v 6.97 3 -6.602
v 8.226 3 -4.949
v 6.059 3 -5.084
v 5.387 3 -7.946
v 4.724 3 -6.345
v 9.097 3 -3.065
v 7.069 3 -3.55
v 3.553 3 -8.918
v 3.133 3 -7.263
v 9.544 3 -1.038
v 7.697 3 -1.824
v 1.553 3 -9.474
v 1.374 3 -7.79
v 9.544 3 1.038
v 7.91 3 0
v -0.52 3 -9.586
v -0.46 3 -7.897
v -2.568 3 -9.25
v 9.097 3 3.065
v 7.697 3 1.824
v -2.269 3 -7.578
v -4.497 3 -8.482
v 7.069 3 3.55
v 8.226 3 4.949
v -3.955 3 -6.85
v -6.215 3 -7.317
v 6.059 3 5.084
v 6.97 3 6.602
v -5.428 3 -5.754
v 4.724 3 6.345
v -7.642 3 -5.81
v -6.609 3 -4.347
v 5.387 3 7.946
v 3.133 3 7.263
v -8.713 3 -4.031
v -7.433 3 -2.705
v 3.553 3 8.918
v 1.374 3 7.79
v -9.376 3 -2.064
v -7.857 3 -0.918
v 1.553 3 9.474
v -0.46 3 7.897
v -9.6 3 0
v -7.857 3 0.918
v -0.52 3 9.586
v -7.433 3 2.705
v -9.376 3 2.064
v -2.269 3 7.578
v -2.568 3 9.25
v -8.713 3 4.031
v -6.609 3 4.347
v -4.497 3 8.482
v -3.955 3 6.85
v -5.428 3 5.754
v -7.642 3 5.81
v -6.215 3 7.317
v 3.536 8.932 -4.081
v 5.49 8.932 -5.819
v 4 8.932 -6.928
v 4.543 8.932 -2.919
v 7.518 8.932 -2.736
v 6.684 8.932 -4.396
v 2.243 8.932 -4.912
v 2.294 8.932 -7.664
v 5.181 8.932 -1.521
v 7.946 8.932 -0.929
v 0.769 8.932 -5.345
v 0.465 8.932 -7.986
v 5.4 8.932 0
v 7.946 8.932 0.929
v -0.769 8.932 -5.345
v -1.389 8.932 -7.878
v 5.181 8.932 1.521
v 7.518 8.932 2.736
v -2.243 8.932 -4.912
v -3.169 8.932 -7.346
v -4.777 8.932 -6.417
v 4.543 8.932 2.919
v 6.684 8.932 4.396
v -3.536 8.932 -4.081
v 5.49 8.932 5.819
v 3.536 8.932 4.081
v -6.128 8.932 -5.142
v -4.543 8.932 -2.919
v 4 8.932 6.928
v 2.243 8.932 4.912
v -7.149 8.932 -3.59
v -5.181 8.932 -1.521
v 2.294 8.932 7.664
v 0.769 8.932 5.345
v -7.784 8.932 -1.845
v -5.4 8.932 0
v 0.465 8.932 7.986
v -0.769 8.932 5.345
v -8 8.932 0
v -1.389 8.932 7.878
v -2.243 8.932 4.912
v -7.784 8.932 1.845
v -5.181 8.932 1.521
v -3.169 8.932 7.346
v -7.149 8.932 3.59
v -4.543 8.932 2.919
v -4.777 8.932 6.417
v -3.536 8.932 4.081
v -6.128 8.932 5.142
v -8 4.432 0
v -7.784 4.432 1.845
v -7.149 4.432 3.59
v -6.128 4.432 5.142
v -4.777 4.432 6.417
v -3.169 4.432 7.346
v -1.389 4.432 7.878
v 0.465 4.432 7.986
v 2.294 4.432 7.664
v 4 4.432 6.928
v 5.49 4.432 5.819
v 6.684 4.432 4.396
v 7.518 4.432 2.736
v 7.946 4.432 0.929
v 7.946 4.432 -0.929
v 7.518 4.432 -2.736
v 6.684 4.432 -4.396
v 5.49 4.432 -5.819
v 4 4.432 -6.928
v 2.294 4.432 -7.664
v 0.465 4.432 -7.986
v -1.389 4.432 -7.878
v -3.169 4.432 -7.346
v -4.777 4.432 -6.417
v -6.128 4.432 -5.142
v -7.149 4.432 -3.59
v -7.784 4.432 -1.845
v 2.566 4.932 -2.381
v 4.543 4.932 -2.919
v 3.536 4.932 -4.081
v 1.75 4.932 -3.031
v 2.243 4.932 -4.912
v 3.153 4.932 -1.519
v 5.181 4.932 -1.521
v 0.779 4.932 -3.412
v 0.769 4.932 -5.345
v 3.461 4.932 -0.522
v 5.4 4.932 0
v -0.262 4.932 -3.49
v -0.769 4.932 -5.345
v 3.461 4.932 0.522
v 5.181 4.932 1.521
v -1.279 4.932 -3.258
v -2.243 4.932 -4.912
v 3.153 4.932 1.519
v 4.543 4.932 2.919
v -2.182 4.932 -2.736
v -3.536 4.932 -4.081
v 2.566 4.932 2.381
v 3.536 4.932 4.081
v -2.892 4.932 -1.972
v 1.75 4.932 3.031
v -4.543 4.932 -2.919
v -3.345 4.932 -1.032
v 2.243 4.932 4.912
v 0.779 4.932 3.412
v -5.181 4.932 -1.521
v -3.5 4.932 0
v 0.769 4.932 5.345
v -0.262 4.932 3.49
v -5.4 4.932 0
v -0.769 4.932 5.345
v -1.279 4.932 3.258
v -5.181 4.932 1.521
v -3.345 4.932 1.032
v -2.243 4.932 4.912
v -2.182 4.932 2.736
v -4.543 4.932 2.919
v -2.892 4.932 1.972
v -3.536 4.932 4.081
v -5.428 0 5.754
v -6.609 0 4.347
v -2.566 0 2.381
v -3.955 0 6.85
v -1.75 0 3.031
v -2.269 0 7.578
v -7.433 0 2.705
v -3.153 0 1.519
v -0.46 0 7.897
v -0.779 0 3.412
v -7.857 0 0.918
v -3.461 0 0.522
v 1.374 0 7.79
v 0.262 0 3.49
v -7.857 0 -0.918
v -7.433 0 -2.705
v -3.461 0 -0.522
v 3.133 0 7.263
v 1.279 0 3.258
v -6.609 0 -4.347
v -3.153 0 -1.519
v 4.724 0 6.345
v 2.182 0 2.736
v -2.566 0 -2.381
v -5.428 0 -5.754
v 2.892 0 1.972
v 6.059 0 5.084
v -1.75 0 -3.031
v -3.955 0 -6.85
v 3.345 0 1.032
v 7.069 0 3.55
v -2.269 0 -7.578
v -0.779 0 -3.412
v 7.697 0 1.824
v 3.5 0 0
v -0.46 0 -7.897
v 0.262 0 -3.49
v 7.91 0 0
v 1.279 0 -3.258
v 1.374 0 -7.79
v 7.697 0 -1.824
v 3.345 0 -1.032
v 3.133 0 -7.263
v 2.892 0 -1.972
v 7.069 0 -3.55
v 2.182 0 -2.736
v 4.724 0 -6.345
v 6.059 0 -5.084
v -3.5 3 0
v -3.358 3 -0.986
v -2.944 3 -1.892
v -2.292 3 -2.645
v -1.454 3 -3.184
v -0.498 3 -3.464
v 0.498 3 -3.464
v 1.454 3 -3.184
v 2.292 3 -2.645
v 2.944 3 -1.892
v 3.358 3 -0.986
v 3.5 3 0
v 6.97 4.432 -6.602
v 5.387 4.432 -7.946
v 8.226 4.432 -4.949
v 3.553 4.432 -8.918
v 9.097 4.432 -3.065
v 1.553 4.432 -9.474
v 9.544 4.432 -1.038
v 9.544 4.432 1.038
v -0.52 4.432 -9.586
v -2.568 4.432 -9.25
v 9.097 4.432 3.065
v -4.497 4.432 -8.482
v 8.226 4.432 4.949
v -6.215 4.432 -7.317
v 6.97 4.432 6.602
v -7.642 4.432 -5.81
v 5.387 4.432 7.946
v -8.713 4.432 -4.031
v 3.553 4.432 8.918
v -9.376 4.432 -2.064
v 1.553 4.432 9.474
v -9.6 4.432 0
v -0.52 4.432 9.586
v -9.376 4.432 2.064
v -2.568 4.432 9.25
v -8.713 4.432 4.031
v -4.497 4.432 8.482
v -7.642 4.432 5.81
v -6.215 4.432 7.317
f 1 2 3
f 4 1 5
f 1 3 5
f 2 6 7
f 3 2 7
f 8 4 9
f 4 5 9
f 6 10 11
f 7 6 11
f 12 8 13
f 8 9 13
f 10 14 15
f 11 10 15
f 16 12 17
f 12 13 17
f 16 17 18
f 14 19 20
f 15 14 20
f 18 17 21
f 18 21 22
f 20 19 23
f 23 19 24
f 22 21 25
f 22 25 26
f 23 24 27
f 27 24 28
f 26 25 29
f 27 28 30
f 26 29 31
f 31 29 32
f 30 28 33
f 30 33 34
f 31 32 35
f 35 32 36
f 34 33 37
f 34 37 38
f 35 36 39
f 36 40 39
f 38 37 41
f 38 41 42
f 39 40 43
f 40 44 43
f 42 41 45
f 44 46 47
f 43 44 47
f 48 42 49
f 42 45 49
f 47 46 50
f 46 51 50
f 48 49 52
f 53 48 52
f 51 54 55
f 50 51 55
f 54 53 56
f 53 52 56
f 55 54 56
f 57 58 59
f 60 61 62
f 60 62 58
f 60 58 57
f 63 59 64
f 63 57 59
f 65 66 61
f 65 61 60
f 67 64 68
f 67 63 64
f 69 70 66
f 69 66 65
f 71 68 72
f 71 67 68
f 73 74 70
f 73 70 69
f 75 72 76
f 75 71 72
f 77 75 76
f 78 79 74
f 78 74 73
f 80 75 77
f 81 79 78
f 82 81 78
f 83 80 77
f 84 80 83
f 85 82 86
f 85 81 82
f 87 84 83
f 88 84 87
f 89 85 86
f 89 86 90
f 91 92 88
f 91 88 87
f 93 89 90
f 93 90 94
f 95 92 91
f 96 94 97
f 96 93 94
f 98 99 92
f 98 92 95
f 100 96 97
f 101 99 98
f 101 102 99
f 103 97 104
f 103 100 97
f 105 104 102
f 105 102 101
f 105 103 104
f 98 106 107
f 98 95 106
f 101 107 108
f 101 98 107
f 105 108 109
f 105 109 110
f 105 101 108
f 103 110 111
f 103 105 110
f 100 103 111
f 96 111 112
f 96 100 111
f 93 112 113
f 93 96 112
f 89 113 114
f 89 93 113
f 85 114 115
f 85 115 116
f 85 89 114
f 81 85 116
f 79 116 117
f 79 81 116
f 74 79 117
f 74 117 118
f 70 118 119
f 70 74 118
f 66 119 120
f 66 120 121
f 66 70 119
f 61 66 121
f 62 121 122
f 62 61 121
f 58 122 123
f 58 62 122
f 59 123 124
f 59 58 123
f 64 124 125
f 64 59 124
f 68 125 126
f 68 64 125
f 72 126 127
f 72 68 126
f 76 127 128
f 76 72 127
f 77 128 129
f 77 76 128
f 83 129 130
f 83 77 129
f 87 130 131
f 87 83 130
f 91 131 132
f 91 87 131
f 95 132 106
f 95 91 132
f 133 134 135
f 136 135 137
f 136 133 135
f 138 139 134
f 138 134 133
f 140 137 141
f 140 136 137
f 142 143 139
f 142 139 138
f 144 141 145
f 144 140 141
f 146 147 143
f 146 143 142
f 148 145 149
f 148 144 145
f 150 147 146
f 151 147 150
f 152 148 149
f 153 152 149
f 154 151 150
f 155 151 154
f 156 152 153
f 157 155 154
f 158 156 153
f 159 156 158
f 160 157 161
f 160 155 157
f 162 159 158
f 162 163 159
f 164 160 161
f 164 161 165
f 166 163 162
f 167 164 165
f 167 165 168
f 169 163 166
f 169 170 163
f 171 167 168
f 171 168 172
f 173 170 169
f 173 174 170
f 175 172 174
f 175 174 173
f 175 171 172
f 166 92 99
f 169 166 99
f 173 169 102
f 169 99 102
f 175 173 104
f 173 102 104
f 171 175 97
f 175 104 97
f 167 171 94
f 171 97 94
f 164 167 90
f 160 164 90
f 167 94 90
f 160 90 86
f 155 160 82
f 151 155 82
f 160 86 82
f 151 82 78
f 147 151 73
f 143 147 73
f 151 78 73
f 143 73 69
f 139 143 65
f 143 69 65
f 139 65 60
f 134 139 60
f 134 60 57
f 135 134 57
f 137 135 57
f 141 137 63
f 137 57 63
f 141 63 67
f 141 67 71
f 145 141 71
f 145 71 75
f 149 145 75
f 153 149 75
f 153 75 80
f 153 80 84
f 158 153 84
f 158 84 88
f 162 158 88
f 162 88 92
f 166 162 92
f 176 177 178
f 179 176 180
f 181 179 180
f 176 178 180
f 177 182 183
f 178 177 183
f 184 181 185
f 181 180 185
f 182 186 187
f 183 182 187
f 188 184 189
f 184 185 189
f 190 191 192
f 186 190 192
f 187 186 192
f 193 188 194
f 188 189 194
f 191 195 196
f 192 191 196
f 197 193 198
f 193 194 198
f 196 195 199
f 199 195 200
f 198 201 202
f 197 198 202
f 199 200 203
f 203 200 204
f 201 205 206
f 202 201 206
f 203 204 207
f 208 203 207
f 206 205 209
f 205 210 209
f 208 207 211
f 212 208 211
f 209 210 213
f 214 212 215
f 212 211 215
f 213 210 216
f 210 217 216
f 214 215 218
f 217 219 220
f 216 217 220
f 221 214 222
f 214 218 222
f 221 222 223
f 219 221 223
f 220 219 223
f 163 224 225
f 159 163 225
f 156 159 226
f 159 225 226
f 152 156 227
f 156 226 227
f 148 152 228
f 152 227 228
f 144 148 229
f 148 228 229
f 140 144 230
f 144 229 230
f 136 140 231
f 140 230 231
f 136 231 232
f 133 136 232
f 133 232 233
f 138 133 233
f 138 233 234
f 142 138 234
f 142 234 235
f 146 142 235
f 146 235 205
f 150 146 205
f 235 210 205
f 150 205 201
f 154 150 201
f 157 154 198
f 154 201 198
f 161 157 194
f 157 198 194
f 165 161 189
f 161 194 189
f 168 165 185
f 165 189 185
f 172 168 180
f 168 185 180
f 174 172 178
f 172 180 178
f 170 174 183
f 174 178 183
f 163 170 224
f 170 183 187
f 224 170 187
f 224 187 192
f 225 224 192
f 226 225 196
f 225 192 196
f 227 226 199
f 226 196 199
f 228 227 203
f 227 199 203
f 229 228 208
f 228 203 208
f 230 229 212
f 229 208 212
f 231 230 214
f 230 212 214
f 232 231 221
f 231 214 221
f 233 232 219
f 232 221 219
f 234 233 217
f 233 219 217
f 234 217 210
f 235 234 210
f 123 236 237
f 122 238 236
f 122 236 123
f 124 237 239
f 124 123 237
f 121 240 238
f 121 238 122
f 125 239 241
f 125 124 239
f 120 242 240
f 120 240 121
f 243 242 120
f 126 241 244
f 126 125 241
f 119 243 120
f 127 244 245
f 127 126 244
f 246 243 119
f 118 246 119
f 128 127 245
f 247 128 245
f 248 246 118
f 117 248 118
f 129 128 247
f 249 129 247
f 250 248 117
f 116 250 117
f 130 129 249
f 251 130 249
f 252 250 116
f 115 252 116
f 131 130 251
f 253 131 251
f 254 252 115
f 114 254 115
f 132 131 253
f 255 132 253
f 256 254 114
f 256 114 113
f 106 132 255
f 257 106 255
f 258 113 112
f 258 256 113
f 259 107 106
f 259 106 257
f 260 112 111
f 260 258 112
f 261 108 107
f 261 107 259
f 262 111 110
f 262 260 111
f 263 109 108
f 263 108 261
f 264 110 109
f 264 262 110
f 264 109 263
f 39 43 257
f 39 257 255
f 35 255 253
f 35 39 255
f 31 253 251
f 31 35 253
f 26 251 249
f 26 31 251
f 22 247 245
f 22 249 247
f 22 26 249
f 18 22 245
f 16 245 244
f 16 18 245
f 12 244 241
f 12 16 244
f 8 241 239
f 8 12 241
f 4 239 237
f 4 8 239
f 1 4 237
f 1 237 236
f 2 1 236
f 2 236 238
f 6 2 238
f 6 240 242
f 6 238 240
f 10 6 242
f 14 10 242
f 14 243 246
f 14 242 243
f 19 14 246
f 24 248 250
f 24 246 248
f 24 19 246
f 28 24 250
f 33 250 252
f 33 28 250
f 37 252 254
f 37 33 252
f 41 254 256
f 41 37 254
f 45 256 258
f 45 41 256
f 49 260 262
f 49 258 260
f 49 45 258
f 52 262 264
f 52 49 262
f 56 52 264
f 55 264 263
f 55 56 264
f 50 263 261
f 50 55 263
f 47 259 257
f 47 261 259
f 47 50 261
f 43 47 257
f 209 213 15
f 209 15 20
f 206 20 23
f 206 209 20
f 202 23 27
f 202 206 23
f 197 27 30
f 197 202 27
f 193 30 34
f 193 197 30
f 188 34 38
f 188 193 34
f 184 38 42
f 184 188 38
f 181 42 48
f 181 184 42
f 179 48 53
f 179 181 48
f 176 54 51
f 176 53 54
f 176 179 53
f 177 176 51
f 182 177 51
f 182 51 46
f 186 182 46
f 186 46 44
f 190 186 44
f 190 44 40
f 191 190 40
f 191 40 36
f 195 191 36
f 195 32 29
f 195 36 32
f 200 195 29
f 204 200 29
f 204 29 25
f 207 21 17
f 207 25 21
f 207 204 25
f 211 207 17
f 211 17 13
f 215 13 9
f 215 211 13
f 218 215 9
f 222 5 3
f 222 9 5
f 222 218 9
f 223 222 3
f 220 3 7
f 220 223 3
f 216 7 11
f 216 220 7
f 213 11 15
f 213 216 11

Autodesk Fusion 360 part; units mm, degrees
sketch "Sketch1" plane through (0, 0, 0) normal (0, 1, 0) x (1, 0, 0)
  circle A0 centre (0, 0) radius 7.91
  circle A1 centre (0, 0) radius 3.5
  dimension "d1" = 15.82
  dimension "d2" = 7
extrude "Extrude1" add sketch "Sketch1" along normal blind 3
sketch "Sketch2" plane through (0, 3, 0) normal (0, 1, 0) x (-1, 0, 0)
  circle A0 centre (0, 0) radius 3.5
  circle A1 centre (0, 0) radius 7.91
  circle A2 centre (0, 0) radius 9.6
  dimension "d5" = 19.2
extrude "Extrude2" add sketch "Sketch2" along normal blind 6.932 contours A1 | A2
sketch "Sketch3" plane through (0, 9.932, 0) normal (0, 1, 0) x (-1, 0, 0)
  circle A0 centre (0, 0) radius 3.5
  circle A1 centre (0, 0) radius 9.6
  circle A2 centre (0, 0) radius 5.4
  dimension "d8" = 10.8
extrude "Extrude3" cut sketch "Sketch3" against normal blind 3 contours A2
sketch "Sketch4" plane through (0, 9.932, 0) normal (0, 1, 0) x (-1, 0, 0)
  circle A0 centre (0, 0) radius 5.4
  circle A1 centre (0, 0) radius 9.6
  circle A2 centre (0, 0) radius 8
extrude "Extrude4" cut sketch "Sketch4" against normal blind 5.5 contours A1
extrude "Extrude5" cut 1 faces at (-4.7335, 6.932, -0.4422) along direction (0, -1, 0) blind 2
extrude "Extrude6" cut 1 faces at (-7.0834, 9.932, -0.6657) along direction (0, -1, 0) blind 1
